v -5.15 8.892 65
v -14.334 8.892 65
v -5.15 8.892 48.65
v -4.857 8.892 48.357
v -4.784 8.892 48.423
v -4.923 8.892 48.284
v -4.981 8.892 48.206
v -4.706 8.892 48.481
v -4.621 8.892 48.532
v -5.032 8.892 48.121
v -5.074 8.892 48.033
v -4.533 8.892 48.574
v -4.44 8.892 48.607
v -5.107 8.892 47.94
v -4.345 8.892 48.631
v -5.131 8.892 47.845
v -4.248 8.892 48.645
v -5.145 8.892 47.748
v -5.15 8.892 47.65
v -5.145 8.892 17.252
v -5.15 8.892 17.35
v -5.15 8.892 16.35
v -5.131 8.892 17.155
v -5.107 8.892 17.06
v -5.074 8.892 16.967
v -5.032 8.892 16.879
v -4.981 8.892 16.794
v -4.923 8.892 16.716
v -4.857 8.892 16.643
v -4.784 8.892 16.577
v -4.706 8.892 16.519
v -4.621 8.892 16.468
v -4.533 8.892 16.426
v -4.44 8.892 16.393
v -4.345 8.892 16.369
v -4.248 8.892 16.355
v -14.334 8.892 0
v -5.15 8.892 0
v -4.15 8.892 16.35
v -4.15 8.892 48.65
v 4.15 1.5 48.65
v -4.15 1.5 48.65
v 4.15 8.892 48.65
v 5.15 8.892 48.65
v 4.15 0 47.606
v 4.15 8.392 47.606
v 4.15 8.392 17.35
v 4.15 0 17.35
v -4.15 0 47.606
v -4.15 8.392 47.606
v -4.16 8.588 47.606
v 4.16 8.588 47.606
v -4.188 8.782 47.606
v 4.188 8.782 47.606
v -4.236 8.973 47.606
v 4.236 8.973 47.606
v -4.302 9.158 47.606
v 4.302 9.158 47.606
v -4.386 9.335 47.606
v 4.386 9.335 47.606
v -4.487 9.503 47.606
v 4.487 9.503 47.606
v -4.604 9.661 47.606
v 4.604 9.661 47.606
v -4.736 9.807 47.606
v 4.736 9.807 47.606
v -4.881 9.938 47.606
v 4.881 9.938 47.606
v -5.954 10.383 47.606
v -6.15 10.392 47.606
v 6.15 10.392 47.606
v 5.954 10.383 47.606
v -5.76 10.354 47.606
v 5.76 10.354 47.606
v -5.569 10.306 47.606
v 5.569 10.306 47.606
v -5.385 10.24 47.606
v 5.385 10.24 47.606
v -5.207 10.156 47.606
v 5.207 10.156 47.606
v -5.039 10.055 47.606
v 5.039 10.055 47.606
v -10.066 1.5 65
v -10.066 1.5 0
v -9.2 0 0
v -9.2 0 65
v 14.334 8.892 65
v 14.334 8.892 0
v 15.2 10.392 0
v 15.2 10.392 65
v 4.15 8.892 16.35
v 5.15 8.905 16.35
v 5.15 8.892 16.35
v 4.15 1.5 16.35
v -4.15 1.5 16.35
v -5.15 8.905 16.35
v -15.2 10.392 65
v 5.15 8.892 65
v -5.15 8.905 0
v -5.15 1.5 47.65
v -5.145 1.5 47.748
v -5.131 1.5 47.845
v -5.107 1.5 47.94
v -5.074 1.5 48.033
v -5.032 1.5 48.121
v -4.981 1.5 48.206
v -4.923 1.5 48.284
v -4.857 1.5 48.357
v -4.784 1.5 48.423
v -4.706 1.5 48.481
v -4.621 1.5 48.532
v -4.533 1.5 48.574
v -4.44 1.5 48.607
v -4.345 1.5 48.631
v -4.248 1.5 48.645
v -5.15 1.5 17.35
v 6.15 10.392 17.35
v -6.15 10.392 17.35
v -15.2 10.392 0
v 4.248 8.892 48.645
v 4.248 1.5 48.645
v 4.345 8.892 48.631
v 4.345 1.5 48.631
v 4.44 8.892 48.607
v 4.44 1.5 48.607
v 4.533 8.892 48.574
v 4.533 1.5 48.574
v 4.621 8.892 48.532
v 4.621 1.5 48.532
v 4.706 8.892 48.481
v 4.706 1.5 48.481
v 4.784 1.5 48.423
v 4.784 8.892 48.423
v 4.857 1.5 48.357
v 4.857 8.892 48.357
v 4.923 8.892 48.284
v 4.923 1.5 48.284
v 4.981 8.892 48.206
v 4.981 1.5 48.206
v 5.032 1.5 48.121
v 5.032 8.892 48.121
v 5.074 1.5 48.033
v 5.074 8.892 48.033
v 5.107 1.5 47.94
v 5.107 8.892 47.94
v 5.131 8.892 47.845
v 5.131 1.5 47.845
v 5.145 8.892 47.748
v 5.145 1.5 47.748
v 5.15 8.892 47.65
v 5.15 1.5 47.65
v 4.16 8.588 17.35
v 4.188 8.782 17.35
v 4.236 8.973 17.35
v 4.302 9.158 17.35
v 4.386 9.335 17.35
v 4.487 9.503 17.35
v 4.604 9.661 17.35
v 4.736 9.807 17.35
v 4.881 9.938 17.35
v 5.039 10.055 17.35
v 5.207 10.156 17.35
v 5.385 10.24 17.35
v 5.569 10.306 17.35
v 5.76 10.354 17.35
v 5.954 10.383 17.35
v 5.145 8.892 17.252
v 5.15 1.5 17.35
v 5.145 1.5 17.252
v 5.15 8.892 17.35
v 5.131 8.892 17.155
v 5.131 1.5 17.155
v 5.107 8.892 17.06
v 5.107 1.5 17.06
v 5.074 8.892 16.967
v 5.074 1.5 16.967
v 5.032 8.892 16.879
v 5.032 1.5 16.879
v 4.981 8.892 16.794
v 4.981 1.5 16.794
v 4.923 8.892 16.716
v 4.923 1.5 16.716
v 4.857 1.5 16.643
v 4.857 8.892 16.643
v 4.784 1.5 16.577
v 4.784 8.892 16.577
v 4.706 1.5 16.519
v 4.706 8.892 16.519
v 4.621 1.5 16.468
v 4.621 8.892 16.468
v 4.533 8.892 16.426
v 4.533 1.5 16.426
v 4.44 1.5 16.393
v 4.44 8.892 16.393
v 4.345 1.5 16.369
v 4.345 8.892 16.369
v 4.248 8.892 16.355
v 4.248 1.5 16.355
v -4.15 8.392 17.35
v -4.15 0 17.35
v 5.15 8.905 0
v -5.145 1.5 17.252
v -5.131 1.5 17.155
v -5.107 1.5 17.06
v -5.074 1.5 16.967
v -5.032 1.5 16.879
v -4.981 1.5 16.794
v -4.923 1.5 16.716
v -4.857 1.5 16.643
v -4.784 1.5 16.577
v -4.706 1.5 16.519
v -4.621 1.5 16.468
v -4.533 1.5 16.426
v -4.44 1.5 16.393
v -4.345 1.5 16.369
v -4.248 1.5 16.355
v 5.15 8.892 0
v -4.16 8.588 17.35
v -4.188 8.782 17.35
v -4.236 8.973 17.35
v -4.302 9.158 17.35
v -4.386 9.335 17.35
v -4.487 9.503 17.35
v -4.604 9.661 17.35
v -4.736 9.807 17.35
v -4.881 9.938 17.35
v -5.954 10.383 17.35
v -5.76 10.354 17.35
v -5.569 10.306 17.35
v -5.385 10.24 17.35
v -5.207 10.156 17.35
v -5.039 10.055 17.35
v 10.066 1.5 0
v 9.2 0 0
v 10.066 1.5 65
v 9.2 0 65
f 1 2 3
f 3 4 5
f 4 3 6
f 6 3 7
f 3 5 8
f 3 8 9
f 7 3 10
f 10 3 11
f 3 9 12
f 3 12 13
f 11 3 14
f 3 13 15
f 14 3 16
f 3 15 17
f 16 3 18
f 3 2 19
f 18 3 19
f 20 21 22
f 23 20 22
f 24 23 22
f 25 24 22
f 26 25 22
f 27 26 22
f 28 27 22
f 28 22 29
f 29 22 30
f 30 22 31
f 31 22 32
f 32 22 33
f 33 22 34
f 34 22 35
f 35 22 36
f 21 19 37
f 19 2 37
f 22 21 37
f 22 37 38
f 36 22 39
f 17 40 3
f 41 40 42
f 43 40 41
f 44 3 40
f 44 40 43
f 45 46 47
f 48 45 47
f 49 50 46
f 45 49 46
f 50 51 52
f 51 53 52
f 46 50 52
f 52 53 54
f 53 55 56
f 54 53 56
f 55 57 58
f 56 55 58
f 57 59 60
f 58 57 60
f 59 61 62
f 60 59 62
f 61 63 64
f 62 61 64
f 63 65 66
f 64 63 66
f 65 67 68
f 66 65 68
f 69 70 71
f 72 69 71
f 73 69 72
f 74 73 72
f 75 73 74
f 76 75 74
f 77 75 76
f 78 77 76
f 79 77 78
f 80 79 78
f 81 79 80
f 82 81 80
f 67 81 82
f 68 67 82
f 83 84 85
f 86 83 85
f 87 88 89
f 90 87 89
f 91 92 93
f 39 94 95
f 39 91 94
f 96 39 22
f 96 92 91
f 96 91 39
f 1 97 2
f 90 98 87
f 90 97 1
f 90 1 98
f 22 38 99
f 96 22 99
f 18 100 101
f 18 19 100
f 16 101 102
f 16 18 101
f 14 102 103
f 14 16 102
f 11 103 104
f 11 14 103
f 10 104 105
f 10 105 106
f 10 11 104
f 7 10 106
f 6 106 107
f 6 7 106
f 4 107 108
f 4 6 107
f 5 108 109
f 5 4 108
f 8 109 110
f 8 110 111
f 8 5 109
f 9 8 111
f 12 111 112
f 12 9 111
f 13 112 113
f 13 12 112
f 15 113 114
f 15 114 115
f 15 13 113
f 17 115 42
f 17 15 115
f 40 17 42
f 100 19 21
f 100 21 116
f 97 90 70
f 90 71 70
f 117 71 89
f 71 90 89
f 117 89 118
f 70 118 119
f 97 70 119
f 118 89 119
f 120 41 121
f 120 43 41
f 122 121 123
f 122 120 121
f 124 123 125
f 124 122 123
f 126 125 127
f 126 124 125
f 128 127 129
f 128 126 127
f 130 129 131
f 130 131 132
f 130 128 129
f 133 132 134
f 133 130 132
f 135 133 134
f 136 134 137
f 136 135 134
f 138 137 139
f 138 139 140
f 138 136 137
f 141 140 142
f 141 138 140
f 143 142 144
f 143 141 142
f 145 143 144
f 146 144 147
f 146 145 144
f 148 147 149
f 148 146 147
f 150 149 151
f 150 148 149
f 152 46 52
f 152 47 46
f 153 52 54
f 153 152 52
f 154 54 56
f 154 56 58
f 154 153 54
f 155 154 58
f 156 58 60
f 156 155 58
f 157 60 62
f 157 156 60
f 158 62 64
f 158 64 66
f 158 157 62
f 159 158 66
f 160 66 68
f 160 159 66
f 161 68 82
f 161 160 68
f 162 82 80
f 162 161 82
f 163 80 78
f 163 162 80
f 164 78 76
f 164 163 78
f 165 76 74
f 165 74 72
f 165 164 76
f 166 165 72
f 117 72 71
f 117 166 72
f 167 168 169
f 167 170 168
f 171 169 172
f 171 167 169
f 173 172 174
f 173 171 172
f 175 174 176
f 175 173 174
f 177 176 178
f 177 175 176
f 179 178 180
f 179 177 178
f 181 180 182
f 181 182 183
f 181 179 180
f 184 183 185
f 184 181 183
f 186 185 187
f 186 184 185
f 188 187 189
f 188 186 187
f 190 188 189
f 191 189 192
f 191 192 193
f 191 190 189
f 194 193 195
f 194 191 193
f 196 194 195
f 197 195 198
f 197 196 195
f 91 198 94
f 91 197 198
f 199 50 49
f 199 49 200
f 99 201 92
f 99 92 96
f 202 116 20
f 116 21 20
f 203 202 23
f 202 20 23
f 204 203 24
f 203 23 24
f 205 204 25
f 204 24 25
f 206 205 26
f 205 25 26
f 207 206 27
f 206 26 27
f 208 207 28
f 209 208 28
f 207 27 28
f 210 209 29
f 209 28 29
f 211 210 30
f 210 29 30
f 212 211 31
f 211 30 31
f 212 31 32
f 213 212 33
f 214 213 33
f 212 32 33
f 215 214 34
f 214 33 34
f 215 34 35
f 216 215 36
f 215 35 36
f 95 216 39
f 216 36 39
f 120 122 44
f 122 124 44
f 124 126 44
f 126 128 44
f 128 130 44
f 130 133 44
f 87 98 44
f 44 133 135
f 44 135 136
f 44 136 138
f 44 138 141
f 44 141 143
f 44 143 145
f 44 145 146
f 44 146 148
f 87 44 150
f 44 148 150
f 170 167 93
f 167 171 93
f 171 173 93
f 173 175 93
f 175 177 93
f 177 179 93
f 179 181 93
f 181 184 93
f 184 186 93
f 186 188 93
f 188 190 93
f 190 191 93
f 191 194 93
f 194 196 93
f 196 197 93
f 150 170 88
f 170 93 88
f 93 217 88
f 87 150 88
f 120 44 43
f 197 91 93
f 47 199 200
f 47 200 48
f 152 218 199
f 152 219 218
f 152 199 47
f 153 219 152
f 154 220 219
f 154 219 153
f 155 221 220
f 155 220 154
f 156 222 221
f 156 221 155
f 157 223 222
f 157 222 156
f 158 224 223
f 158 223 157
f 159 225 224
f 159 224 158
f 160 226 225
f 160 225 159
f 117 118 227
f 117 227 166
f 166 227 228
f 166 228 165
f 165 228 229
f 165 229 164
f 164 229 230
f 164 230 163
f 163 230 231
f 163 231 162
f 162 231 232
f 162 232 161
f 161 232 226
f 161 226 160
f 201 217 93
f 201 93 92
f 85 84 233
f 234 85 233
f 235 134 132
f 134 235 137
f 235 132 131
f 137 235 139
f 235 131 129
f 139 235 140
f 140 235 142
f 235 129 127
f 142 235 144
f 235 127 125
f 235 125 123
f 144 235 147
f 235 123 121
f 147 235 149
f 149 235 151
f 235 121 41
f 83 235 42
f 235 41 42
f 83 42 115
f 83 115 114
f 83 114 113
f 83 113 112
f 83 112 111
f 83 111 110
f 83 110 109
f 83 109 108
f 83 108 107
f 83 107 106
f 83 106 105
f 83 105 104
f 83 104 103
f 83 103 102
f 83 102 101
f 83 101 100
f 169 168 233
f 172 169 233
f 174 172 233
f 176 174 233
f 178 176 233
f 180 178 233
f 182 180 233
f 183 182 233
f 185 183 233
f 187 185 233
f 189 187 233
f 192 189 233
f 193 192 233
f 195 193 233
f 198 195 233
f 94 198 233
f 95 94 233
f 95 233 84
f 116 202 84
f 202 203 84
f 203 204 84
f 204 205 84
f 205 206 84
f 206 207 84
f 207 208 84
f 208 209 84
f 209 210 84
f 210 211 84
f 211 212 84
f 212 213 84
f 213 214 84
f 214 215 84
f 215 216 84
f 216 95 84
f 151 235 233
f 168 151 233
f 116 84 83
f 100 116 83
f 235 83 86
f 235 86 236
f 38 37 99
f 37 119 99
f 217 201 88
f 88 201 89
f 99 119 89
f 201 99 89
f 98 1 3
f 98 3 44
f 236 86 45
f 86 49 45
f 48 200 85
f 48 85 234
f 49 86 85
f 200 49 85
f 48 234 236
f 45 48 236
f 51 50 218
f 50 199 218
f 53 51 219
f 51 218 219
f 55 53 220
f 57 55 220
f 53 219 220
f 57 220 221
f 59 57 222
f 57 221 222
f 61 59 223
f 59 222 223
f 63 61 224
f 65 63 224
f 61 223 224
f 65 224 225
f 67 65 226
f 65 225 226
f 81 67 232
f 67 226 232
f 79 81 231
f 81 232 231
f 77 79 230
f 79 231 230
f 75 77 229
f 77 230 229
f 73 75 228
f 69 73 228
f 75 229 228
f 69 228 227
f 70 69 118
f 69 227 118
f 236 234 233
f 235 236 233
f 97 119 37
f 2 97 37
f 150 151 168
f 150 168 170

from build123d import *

# Parameters (mm, degrees)
CASING_W            = 8.3
CASING_H            = 7.392304845
BOSS_EXTRUDE2_DEPTH = 65
SKETCH10_W          = 10.3
SKETCH10_H          = 7.392395682
TOP_CUT_DEPTH       = 16.35
SKETCH11_W          = 10.3
SKETCH11_H          = 7.40522356
BOT_CUT_DEPTH       = 16.35
SKETCH13_W          = 8.3
SKETCH13_H          = 30.255654569
CUT_EXTRUDE8_DEPTH  = 68.55767906
FILLET1_R           = 1
FILLET2_R           = 2


with BuildPart() as part:
    # Casing → Boss-Extrude2 (new body)
    # profile 1 of 2: a face of its own
    with BuildSketch(Plane.XY):
        Polygon((-9.2, 0), (9.2, 0), (10.066025404, 1.5), (8.333974596, 1.5), (5.15, 1.5), (5.15, 8.892304845), (12.601923789, 8.892304845), (14.333974596, 8.892304845), (15.2, 10.392304845), (-15.2, 10.392304845), (-14.333974596, 8.892304845), (-12.601923789, 8.892304845), (-5.15, 8.892304845), (-5.15, 1.5), (-8.333974596, 1.5), (-10.066025404, 1.5), align=None)
        with Locations((0, 5.196152422)):
            Rectangle(CASING_W, CASING_H, mode=Mode.SUBTRACT)
    # profile 2 of 2: a face of its own
    with BuildSketch(Plane.XY):
        with Locations((0, 5.196152422)):
            Rectangle(CASING_W, CASING_H)
    extrude(amount=BOSS_EXTRUDE2_DEPTH)

    # Sketch10 → Top_Cut (cut)
    with BuildSketch(Plane.XY.offset(65)):
        with Locations((0, 5.196197841)):
            Rectangle(SKETCH10_W, SKETCH10_H)
    extrude(amount=-TOP_CUT_DEPTH, mode=Mode.SUBTRACT)

    # Sketch11 → Bot_Cut (cut)
    with BuildSketch(Plane(origin=(0, 0, 0), x_dir=(-1, 0, 0), z_dir=(0, 0, -1))):
        with Locations((0, 5.20261178)):
            Rectangle(SKETCH11_W, SKETCH11_H)
    extrude(amount=-BOT_CUT_DEPTH, mode=Mode.SUBTRACT)

    # Sketch13 → Cut-Extrude8 (cut, through all)
    with BuildSketch(Plane(origin=(0, 10.392304845, 0), x_dir=(1, 0, 0), z_dir=(0, 1, 0))):
        with Locations((0, -32.477827285)):
            Rectangle(SKETCH13_W, SKETCH13_H)
    extrude(amount=-CUT_EXTRUDE8_DEPTH, mode=Mode.SUBTRACT)

    # Fillet1
    fillet1_edges = [part.edges().sort_by_distance(p)[0] for p in [
        (-5.15, 5.196152423, 48.65),
        (5.15, 5.196152423, 48.65),
        (5.15, 5.196152423, 16.35),
        (-5.15, 5.196152423, 16.35),
    ]]
    fillet(fillet1_edges, radius=FILLET1_R)

    # Fillet2
    fillet2_edges = [part.edges().sort_by_distance(p)[0] for p in [
        (4.15, 10.392304845, 32.477827285),
        (-4.15, 10.392304845, 32.477827285),
    ]]
    fillet(fillet2_edges, radius=FILLET2_R)


solid = part.part
